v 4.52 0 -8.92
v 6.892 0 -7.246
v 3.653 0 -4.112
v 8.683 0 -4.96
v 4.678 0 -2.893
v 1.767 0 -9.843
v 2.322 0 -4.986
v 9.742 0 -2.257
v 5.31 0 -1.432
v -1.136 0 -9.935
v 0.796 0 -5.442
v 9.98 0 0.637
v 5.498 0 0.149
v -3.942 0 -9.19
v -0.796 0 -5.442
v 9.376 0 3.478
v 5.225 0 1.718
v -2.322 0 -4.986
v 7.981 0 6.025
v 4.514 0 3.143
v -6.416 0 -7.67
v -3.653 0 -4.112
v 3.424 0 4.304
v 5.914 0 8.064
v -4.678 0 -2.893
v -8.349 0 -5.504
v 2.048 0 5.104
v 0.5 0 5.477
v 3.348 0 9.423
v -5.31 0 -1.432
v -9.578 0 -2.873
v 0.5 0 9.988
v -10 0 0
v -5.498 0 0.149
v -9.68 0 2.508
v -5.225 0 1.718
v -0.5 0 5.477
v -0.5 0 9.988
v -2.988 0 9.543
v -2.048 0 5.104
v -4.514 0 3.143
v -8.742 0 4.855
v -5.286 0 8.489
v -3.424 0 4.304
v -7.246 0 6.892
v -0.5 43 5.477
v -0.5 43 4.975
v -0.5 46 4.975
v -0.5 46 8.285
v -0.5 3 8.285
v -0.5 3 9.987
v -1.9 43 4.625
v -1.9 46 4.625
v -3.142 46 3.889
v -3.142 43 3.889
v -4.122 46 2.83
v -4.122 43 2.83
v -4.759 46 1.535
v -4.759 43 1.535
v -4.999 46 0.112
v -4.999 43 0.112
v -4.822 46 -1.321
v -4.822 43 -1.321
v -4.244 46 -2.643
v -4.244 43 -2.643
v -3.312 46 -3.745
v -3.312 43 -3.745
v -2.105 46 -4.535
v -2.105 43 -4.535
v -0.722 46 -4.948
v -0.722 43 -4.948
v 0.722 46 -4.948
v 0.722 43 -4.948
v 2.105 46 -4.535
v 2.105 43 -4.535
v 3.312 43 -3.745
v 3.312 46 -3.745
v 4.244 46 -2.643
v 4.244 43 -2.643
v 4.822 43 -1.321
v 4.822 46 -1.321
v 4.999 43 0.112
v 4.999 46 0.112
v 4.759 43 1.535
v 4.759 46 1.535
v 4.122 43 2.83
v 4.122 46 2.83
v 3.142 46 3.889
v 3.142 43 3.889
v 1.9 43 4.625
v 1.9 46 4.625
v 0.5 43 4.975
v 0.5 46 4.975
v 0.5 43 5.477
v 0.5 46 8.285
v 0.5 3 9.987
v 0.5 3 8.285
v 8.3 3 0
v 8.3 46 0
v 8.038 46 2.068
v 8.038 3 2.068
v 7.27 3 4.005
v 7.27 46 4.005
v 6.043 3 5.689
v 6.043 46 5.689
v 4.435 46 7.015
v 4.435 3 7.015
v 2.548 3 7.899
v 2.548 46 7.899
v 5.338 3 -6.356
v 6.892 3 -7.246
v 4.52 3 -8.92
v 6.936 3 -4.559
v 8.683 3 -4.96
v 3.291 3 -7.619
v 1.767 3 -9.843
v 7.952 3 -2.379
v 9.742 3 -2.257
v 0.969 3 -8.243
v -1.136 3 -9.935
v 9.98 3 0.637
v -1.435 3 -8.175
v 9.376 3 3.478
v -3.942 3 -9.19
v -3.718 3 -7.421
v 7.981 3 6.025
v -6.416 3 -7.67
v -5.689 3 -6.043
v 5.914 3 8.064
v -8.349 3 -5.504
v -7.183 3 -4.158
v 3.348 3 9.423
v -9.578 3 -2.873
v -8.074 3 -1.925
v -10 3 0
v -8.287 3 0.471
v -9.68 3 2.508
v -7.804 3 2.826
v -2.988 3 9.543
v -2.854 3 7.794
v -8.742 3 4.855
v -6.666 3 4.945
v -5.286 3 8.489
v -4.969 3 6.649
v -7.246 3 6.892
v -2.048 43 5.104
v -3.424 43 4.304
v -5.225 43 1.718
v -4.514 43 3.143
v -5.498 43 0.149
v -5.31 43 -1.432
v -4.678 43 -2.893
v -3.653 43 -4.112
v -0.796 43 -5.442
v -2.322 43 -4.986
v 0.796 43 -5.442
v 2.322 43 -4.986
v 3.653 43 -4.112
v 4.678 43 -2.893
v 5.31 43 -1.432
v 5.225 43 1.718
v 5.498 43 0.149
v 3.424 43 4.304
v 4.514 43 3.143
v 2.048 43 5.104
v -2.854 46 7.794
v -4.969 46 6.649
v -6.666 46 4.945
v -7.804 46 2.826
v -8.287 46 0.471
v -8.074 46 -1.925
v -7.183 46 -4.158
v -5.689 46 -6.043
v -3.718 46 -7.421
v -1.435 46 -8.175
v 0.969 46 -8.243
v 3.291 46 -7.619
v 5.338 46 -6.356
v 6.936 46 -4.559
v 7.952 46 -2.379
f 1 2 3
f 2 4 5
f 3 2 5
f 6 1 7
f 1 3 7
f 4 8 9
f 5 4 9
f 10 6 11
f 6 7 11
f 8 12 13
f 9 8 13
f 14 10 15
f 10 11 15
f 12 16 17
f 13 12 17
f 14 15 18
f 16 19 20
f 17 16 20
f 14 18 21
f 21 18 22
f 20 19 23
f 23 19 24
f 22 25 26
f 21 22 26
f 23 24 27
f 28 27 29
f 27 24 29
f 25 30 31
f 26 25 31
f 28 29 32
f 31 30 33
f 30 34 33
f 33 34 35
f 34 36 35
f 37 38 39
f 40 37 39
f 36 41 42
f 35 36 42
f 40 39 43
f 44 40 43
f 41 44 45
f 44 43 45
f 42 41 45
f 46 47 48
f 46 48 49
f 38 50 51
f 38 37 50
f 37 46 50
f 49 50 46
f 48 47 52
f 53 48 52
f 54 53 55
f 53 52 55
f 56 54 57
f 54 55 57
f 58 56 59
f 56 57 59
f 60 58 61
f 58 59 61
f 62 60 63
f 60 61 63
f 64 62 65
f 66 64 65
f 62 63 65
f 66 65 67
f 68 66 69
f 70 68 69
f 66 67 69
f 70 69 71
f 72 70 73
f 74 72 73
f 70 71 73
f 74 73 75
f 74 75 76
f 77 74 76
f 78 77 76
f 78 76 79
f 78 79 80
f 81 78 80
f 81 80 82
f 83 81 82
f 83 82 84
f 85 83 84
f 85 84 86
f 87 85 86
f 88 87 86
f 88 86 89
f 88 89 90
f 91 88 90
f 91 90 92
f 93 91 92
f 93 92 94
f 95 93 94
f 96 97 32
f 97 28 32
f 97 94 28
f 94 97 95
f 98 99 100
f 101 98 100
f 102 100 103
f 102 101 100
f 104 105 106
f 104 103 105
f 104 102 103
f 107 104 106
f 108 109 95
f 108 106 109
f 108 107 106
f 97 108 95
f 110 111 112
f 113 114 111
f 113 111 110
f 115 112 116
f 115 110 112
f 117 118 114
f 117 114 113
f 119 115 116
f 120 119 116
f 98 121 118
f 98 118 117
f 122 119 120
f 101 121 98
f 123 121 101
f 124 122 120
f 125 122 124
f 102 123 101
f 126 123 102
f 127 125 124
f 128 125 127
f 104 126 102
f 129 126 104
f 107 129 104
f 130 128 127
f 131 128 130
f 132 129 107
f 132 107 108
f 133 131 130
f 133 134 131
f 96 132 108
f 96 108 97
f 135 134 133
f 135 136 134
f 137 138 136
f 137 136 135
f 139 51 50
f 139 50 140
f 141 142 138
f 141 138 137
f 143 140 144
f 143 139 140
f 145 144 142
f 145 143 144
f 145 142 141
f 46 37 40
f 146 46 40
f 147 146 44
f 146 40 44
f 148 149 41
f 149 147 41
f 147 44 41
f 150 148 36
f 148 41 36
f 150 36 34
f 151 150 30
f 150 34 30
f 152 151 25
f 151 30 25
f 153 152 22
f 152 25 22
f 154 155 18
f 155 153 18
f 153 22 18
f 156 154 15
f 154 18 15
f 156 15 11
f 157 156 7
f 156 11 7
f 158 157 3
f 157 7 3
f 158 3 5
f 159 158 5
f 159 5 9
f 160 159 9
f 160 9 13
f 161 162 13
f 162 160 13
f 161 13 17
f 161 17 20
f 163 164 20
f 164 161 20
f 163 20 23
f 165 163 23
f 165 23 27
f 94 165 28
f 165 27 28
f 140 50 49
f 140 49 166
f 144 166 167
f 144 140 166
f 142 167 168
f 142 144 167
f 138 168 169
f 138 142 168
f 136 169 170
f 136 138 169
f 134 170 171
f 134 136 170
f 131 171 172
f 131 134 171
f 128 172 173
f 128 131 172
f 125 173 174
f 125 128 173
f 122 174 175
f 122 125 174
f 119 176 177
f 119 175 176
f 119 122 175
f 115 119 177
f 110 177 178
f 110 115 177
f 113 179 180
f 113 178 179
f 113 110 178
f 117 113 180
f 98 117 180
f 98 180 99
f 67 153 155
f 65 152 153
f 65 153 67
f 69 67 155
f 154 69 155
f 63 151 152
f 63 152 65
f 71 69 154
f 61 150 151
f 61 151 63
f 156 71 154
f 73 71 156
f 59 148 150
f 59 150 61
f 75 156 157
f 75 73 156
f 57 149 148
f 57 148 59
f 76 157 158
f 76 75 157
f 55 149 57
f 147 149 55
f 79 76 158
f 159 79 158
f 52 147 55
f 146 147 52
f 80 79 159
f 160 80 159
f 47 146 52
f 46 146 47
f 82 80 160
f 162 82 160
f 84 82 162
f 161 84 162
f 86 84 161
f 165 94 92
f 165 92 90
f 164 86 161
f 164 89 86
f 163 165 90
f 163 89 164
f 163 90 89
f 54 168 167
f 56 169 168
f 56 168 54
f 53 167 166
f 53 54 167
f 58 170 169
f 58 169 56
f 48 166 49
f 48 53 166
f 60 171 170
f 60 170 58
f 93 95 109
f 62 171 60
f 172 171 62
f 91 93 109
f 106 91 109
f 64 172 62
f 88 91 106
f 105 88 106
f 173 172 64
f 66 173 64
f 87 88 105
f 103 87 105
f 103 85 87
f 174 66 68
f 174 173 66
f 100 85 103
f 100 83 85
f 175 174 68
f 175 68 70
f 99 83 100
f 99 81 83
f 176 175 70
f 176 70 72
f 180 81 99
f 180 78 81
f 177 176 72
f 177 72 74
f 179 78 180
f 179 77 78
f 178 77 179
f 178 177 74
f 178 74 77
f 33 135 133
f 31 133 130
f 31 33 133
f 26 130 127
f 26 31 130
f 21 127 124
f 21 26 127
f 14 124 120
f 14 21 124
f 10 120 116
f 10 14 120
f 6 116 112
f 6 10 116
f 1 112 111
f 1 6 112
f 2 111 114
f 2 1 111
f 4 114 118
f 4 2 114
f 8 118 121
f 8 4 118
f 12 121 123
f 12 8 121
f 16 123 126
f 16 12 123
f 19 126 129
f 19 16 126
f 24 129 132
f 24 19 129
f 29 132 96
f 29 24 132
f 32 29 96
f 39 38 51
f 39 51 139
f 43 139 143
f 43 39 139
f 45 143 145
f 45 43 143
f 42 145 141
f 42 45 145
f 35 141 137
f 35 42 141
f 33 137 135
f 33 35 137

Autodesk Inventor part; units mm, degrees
ref_plane "YZ Plane" through (0, 0, 0) normal (1, 0, 0) x (0, 1, 0)
ref_plane "XZ Plane" through (0, 0, 0) normal (0, 1, 0) x (-1, 0, 0)
ref_plane "XY Plane" through (0, 0, 0) normal (0, 0, 1) x (1, 0, 0)
sketch "草圖1" plane through (0, 0, 0) normal (0, 1, 0) x (-1, 0, 0)
  circle A0 centre (0, 0) radius 10
  dimension "d0" = 20
extrude "擠出1" add sketch "草圖1" along normal blind 3
sketch "草圖2" plane through (0, 3, 0) normal (0, 1, 0) x (1, 0, 0)
  circle A0 centre (0, 0) radius 8.3
  circle A1 centre (0, 0) radius 5.5
  dimension "d3" = 16.6
  dimension "d4" = 11
extrude "擠出2" add sketch "草圖2" along normal blind 43 contours A0 | A1
sketch "草圖3" plane through (0, 0, 0) normal (0, -1, 0) x (1, 0, 0)
  circle A0 centre (0, 0) radius 5.5
  circle A1 centre (0, 0) radius 10 projected
  dimension "d19" = 11
extrude "擠出3" cut sketch "草圖3" against normal blind 43 contours A0
sketch "草圖4" plane through (0, 46, 0) normal (0, 1, 0) x (1, 0, 0)
  point P0 (0, 0)
hole "孔1" at (0, 46, 0) direction (0, -1, 0) diameter 10 end through all
sketch "草圖5" plane through (0, 0, 0) normal (0, -1, 0) x (1, 0, 0)
  circle A0 centre (0, 0) radius 5 projected
  circle A1 centre (0, 0) radius 10 projected
  line L0 (0, 0) -> (0, 9.3404) construction
  line L1 (-0.5, 4.9749) -> (-0.5, 9.9875)
  line L2 (0.5, 4.9749) -> (0.5, 9.9875)
  dimension "d16" = 1
extrude "擠出4" cut sketch "草圖5" against normal through all contours A0 L1 A1 L2 picked at (0.0556, 6.6643)
properties part number "迫緊環"
